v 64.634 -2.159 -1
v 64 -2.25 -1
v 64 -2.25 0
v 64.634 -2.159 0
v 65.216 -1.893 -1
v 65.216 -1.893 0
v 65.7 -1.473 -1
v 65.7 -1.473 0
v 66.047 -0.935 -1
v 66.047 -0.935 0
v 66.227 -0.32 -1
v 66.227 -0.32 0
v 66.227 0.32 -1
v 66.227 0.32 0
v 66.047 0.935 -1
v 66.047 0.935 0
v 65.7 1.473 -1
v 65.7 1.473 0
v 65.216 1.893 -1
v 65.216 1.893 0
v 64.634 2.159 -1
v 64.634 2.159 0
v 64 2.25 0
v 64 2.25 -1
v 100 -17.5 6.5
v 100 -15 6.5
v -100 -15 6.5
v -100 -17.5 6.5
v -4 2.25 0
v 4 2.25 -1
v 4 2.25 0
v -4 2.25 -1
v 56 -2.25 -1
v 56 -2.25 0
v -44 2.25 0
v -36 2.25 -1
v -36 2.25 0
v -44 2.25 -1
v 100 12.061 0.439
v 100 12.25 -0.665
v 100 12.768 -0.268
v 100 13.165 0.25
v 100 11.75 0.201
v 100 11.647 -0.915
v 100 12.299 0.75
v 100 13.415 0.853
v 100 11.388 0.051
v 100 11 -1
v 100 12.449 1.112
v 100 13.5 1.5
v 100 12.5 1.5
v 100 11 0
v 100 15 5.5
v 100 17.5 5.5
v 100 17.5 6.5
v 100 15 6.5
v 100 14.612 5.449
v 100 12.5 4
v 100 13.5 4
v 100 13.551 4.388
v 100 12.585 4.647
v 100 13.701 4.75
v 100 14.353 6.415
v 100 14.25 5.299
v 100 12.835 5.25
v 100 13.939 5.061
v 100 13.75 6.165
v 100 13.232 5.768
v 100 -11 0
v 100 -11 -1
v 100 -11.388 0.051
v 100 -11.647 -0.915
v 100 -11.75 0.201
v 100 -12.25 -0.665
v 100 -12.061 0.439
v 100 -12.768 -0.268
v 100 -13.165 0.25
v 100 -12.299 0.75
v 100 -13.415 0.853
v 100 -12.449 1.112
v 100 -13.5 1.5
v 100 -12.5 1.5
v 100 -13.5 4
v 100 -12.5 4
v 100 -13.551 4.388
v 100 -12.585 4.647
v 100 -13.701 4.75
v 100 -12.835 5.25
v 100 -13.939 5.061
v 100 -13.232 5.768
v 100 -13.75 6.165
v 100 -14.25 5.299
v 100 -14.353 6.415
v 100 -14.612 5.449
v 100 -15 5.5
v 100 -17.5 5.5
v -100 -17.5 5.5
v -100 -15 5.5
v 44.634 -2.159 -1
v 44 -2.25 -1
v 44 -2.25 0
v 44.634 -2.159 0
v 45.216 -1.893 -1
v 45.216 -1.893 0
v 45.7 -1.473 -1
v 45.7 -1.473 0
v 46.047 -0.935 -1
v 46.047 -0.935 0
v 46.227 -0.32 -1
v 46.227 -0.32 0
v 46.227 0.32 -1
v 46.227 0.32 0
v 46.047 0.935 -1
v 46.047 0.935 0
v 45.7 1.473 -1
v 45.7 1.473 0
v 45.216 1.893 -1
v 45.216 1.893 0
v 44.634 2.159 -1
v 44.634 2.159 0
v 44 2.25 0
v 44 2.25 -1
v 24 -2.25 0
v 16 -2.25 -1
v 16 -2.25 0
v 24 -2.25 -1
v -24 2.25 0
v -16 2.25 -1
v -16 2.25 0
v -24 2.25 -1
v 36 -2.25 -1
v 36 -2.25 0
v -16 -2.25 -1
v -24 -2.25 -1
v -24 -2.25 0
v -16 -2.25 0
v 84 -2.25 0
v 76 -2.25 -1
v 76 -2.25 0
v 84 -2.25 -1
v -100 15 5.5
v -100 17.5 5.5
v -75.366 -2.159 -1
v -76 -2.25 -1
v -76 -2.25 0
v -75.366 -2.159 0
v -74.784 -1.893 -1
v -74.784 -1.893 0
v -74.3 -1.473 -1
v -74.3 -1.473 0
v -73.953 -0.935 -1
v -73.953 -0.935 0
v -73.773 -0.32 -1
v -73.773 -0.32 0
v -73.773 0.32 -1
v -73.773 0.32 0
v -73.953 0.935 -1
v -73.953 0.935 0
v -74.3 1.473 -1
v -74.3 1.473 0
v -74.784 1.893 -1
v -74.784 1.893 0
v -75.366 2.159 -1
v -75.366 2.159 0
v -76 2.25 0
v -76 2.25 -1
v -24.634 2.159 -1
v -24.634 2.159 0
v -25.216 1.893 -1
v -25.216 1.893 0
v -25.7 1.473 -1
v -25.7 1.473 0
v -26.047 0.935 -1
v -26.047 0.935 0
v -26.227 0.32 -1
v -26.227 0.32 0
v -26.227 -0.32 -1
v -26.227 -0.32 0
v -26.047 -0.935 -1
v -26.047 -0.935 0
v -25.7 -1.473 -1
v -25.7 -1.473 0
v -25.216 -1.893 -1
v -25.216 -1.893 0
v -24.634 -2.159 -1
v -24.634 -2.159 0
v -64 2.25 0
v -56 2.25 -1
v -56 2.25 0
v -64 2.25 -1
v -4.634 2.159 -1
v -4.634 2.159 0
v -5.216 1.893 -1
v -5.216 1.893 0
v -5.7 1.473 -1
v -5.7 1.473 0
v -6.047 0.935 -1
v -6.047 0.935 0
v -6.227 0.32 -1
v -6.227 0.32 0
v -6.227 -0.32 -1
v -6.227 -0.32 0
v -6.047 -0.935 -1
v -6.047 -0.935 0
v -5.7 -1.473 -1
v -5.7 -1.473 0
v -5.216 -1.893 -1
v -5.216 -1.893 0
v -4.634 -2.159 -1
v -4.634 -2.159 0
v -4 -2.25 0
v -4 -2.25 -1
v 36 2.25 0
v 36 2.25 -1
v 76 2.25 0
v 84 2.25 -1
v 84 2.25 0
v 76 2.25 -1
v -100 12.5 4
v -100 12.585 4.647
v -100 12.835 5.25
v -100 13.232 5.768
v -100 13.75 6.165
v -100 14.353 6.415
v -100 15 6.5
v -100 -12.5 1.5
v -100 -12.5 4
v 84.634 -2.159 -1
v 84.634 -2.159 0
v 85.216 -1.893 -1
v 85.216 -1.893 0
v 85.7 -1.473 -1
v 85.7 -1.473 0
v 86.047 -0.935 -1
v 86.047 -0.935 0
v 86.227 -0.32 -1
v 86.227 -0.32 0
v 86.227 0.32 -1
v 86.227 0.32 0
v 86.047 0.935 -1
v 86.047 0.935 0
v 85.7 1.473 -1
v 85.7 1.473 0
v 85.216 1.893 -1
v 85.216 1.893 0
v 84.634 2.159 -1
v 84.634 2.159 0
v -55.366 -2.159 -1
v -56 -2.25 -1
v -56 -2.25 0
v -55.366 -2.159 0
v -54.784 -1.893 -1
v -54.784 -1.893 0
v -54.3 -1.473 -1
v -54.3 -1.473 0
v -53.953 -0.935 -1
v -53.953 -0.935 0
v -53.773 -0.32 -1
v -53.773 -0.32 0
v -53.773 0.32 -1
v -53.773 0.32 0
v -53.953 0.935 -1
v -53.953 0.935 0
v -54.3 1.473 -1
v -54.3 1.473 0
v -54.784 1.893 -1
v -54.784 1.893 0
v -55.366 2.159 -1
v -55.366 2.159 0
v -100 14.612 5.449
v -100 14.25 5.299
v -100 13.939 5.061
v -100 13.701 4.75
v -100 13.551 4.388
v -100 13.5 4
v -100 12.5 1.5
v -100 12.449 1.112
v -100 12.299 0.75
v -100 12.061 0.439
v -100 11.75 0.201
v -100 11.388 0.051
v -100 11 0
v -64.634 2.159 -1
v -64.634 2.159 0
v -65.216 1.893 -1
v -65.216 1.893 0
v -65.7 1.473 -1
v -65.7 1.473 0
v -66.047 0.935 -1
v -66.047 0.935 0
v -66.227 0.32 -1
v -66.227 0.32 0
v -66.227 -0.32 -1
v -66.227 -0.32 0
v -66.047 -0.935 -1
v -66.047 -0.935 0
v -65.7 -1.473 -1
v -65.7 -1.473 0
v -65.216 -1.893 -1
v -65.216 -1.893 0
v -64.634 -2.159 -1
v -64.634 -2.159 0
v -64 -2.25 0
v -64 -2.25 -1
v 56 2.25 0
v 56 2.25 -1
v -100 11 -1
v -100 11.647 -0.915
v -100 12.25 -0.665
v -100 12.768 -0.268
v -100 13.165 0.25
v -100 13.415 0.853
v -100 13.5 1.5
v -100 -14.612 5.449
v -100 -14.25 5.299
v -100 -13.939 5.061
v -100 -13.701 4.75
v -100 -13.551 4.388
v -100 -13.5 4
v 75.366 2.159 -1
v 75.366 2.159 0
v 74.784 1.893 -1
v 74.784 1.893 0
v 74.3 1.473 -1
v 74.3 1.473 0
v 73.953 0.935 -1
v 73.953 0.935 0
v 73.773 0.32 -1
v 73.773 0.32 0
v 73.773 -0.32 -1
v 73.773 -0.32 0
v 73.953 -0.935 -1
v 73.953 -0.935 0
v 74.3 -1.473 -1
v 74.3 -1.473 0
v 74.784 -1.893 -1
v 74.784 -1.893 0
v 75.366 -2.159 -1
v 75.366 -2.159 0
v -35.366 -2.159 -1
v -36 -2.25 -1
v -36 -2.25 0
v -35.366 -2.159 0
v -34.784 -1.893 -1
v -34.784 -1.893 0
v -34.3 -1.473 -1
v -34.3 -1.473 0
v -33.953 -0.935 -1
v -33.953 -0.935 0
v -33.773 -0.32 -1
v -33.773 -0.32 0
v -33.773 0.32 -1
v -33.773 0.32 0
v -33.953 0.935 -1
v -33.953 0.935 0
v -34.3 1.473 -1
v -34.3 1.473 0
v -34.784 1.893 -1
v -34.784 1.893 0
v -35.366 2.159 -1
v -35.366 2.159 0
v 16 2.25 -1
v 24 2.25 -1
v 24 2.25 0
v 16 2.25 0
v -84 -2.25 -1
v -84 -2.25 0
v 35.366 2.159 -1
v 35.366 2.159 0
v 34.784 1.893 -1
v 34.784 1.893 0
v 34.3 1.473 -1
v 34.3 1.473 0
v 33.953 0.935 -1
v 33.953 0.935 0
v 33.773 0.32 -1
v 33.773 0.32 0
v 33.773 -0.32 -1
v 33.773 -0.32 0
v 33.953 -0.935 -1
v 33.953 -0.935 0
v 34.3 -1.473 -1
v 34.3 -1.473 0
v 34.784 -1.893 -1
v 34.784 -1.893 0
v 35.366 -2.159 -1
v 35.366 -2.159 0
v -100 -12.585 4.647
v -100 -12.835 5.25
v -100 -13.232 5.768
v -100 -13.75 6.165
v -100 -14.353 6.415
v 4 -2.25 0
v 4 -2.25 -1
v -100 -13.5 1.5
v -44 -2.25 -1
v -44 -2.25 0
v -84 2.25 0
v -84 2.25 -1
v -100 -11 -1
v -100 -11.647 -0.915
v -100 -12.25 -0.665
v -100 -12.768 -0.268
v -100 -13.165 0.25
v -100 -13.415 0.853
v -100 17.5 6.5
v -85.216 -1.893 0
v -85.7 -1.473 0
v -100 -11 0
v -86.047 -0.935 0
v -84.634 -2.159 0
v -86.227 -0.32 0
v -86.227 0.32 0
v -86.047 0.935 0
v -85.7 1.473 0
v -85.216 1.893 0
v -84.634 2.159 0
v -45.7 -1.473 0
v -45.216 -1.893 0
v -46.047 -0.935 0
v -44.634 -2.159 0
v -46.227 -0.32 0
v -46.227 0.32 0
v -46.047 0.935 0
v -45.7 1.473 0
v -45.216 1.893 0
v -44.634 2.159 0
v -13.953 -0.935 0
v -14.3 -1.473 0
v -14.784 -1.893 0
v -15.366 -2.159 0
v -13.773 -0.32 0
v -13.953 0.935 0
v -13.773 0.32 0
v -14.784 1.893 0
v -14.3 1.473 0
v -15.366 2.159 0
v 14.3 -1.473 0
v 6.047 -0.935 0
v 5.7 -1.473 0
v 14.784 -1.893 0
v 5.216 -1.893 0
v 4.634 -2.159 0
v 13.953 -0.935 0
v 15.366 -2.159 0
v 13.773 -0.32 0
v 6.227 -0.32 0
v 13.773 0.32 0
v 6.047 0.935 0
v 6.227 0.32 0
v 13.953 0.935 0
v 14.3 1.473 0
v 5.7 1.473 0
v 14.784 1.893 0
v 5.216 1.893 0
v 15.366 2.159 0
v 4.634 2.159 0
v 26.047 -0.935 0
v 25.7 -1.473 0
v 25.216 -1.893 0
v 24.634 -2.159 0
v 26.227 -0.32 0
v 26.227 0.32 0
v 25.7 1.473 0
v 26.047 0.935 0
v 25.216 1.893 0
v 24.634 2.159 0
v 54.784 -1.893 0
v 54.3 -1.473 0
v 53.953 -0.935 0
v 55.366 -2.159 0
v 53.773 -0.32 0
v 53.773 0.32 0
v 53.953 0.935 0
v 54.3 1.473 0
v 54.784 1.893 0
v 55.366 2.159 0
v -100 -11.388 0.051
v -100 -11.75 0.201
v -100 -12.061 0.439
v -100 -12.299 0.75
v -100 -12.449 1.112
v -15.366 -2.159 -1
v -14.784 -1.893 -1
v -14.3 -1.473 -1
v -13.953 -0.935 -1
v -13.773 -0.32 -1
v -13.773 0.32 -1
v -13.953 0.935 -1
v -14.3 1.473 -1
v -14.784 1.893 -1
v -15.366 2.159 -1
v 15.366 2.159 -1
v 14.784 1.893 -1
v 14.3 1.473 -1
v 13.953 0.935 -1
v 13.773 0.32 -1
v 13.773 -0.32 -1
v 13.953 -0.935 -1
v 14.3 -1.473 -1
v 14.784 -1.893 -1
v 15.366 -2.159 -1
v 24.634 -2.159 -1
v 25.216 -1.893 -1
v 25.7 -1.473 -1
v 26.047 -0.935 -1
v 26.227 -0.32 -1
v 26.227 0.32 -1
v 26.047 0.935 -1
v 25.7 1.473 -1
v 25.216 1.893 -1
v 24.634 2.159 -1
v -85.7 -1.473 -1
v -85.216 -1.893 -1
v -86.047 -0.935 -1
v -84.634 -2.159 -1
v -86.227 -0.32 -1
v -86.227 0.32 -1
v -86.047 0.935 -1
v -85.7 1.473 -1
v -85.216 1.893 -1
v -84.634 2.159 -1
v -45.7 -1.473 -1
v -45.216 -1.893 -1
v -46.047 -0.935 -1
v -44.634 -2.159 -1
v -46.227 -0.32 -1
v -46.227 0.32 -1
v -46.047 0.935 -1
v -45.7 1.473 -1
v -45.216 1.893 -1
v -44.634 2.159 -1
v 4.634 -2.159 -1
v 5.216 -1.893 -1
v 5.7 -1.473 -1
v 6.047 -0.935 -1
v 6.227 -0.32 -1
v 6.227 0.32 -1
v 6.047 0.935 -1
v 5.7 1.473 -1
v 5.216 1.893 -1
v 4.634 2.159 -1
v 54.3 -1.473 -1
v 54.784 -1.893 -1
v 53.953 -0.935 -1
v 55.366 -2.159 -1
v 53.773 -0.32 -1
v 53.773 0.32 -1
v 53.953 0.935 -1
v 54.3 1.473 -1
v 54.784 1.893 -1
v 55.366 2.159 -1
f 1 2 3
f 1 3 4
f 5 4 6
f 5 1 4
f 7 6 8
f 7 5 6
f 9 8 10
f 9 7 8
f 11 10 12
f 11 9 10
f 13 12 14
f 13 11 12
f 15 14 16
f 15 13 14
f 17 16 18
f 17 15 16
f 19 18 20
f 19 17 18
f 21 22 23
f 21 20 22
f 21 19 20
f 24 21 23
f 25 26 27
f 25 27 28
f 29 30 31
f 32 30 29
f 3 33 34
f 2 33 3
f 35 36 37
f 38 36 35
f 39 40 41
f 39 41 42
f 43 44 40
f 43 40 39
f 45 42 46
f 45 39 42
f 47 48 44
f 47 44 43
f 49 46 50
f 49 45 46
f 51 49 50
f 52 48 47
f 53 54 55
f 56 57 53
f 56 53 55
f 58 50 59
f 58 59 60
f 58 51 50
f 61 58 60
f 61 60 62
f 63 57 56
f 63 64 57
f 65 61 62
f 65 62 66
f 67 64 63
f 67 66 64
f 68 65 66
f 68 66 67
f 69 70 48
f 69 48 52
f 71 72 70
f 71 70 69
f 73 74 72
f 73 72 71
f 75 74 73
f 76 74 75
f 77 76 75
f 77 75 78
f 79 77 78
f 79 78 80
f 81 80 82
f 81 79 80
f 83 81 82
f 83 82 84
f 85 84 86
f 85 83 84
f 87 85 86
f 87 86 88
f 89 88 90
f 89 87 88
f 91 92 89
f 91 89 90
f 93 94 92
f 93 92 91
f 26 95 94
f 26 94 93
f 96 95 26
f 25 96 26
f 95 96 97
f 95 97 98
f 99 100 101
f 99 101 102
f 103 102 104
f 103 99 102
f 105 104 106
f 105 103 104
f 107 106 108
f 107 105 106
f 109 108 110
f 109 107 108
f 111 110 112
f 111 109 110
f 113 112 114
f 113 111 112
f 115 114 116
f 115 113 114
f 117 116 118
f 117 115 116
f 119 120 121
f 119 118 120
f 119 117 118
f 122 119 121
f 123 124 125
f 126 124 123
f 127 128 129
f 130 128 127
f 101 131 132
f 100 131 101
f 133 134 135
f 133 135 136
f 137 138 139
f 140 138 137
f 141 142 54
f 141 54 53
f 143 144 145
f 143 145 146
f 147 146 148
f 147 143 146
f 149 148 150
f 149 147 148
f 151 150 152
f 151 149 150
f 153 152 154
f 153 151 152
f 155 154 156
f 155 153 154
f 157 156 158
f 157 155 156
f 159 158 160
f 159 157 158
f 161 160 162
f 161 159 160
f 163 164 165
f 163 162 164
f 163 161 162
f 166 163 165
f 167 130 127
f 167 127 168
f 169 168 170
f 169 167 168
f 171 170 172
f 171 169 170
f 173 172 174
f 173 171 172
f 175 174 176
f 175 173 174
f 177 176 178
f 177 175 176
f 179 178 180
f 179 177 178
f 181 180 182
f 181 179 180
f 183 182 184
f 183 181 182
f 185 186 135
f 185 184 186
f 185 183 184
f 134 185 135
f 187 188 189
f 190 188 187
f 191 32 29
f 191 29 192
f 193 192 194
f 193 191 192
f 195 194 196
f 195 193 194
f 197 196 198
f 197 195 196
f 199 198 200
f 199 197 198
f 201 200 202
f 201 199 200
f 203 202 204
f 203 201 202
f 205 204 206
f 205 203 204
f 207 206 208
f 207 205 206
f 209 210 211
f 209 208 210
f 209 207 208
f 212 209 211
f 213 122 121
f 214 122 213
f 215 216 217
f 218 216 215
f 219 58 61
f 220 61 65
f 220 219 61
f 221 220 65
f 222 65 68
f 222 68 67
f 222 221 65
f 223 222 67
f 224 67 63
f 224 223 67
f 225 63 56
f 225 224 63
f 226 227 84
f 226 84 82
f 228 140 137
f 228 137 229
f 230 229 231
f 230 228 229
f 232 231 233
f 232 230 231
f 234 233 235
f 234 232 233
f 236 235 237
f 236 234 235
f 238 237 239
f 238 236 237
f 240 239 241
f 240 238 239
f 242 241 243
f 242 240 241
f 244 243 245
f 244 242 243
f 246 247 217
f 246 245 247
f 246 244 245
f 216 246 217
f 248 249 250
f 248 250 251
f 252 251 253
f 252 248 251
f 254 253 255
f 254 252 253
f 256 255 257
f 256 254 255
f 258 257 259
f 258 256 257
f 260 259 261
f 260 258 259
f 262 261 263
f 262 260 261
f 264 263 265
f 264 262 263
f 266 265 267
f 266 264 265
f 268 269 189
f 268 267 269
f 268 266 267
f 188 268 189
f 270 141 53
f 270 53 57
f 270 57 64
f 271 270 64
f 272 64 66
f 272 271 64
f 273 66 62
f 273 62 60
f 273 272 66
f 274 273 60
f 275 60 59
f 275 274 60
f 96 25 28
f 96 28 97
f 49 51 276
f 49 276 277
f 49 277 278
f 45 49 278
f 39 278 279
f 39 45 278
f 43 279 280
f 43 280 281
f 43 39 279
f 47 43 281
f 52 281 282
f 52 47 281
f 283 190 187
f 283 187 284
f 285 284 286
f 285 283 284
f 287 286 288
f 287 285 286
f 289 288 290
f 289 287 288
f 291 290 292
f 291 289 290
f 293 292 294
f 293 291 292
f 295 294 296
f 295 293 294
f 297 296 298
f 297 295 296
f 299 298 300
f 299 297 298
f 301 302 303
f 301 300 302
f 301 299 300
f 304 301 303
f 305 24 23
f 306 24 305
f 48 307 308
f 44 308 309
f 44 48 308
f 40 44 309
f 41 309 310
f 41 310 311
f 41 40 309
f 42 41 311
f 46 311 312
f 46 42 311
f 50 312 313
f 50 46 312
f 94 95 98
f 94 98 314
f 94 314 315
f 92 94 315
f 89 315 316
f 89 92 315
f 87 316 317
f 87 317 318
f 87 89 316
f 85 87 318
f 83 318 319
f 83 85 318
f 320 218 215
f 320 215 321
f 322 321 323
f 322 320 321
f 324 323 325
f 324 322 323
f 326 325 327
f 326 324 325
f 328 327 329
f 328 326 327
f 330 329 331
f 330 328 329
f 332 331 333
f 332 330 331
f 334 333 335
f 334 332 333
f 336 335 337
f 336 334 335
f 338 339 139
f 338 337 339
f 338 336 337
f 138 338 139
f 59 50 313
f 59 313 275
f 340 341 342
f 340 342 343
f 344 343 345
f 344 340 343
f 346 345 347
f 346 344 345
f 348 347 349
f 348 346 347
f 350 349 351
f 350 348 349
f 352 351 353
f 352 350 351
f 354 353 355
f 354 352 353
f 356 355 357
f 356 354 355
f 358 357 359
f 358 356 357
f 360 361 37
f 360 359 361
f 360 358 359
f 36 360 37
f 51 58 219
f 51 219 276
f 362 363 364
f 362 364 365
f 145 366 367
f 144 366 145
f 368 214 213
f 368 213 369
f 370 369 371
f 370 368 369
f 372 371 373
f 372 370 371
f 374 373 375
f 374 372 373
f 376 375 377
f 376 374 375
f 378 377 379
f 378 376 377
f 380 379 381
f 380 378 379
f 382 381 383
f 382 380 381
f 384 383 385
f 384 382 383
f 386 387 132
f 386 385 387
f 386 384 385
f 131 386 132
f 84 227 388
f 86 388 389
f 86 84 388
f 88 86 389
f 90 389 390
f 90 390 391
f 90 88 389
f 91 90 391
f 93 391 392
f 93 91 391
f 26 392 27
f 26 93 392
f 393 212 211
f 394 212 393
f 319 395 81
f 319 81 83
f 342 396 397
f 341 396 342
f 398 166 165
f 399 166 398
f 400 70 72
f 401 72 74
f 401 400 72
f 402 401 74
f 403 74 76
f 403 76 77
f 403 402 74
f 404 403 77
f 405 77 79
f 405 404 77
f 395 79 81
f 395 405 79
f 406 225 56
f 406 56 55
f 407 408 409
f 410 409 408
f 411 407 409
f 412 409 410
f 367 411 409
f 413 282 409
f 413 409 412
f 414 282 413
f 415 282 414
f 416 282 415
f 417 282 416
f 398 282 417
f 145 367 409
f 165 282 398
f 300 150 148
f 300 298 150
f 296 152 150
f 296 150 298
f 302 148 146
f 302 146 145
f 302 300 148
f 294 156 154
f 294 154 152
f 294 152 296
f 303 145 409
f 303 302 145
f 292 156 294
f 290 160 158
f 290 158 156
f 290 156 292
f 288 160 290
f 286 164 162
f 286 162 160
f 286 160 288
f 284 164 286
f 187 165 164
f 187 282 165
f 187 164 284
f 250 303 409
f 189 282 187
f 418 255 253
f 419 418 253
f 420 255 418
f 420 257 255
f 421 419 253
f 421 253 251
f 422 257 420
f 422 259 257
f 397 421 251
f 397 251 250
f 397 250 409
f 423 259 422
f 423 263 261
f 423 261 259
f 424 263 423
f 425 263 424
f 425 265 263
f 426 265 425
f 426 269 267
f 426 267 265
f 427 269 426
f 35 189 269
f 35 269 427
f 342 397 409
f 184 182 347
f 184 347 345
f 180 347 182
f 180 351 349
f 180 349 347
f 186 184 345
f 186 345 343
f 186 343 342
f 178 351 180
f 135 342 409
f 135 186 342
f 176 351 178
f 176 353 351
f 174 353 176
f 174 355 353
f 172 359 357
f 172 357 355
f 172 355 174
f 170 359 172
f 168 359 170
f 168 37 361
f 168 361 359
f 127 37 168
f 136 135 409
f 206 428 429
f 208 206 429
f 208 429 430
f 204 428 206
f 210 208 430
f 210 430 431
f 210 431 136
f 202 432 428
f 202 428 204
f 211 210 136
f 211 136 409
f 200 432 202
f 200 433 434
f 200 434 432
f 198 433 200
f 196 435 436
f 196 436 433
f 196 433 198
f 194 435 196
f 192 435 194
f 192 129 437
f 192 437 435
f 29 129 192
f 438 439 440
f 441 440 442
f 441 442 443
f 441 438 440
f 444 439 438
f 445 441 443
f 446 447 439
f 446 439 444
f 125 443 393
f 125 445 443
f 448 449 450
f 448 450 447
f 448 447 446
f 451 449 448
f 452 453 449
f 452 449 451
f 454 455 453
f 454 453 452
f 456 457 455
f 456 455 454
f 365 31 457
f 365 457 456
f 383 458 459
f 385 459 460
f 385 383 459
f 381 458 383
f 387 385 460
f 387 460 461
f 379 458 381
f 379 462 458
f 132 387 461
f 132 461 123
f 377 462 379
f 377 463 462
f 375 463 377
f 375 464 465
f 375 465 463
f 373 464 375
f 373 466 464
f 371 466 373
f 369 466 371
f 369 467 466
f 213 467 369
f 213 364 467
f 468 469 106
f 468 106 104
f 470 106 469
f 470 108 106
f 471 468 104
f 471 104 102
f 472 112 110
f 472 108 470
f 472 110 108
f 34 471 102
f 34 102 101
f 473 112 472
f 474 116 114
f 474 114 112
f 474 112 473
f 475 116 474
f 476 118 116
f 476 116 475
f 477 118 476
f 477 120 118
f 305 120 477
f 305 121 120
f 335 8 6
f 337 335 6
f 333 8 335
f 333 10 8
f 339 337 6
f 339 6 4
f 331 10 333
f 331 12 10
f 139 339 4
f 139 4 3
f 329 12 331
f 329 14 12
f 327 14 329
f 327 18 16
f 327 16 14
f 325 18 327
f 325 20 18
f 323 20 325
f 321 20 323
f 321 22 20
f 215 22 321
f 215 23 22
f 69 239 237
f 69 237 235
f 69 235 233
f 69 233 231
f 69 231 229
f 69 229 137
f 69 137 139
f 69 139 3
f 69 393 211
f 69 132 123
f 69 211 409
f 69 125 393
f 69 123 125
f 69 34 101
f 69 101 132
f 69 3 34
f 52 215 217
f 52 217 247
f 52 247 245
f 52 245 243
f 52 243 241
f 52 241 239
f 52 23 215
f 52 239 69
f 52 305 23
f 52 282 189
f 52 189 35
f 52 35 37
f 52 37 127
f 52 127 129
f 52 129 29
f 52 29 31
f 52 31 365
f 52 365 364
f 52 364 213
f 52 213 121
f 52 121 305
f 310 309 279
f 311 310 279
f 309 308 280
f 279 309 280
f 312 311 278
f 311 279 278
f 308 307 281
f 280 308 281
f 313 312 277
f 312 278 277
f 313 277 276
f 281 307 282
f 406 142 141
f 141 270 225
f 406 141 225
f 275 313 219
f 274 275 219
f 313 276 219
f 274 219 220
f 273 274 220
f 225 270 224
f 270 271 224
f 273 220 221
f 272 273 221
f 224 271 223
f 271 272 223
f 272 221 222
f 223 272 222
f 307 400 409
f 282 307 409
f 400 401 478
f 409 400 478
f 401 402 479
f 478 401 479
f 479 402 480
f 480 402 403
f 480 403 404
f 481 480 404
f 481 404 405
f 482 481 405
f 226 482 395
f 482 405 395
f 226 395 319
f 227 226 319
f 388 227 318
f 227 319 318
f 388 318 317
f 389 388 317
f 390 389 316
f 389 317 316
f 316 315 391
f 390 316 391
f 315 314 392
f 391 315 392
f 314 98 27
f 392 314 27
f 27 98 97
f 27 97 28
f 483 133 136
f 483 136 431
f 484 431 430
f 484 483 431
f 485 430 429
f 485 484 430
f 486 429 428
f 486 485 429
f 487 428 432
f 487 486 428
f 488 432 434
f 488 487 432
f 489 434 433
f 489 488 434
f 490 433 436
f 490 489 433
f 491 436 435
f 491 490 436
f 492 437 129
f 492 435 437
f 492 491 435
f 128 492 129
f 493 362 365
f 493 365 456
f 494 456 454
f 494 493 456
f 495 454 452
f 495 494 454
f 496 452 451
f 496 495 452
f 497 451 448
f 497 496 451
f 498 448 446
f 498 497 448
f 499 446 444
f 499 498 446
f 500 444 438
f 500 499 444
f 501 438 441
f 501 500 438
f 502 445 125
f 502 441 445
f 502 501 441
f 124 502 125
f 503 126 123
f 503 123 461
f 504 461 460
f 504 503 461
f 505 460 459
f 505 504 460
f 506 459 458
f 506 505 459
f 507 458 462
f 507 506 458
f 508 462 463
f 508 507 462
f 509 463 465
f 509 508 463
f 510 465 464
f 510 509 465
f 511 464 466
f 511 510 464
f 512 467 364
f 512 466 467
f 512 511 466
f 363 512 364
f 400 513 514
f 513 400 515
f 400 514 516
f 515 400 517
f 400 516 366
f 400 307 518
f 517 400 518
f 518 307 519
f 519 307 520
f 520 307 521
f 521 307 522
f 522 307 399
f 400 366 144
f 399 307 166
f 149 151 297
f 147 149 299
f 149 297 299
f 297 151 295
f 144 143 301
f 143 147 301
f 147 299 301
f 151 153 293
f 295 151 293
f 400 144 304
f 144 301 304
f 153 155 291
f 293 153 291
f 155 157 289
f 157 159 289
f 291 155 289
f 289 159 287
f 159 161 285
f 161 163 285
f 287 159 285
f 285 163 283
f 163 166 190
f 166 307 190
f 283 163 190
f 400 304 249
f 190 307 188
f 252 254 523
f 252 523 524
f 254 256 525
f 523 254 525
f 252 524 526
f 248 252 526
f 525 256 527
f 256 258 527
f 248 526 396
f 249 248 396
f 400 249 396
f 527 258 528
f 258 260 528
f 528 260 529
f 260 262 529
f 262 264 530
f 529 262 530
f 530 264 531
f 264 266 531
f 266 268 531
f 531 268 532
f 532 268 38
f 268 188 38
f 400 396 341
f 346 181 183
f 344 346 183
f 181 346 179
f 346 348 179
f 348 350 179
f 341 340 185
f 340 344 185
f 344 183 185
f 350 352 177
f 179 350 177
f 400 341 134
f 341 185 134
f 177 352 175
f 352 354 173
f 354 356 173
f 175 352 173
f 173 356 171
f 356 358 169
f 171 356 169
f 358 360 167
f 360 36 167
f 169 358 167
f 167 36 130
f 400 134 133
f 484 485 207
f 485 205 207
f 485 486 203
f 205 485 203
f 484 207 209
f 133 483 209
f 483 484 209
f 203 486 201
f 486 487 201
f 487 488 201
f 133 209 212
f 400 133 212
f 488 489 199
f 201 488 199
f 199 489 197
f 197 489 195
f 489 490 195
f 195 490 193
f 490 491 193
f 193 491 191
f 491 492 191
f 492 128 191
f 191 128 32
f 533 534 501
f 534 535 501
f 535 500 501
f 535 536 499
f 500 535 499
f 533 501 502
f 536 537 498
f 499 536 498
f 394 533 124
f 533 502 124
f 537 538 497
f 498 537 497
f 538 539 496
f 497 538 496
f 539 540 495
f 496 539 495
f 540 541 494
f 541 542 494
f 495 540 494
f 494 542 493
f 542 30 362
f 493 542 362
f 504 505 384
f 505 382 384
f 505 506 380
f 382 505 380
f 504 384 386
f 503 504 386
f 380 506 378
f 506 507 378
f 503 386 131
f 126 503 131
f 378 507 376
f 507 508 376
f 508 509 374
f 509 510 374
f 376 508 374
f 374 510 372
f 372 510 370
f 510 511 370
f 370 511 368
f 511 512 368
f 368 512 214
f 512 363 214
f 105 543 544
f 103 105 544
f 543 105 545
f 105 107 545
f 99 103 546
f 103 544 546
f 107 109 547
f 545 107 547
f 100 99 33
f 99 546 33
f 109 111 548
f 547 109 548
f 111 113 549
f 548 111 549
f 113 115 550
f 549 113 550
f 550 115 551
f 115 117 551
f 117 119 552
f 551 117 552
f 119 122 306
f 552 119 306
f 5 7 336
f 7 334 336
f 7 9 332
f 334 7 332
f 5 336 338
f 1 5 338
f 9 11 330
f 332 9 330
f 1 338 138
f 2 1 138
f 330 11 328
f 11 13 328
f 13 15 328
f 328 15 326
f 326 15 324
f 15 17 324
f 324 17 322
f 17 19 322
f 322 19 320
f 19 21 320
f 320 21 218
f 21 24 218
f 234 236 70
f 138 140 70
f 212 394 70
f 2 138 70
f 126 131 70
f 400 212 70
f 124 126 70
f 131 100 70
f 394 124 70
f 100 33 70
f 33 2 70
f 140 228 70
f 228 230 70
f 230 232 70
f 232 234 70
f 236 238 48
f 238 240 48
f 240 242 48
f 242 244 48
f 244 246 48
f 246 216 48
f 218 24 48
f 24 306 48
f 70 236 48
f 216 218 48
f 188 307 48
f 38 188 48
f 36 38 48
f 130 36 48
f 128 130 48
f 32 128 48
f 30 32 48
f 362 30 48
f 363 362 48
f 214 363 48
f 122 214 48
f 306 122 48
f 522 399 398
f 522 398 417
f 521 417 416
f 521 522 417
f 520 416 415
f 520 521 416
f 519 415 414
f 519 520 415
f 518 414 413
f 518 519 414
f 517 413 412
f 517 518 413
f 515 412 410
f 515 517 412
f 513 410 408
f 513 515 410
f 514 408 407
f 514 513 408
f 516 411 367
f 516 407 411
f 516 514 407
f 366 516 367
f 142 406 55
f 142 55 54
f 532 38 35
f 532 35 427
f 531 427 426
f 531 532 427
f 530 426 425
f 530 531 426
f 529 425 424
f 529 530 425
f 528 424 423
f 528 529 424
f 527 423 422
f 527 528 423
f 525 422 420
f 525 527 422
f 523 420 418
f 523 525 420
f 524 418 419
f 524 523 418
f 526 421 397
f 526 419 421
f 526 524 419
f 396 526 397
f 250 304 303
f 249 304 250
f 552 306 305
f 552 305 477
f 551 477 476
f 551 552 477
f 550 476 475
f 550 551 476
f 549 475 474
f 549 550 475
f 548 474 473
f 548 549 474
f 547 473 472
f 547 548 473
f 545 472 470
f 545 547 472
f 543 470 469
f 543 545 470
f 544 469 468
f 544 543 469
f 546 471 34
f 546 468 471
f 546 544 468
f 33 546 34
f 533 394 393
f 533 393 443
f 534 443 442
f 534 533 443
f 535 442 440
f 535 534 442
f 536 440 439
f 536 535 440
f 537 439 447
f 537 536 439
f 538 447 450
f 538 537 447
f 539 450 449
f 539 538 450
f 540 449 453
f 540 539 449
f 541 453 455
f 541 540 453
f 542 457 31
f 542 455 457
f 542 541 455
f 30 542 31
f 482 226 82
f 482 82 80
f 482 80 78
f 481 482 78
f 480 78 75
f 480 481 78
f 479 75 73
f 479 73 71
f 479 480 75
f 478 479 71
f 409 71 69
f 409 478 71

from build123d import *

# Parameters (mm, degrees)
SKETCH_1_W                         = 200
SKETCH_1_H                         = 27
SM_BASE_FLANGE_1_DEPTH             = 1
SM_EDGE_FLANGE_1_STRIP_W           = 7
SM_EDGE_FLANGE_1_STRIP_H           = 1
SM_EDGE_FLANGE_1_STRIP_CUT_DEPTH   = 200
SM_EDGE_FLANGE_1_STRIP_2_W         = 7
SM_EDGE_FLANGE_1_STRIP_2_H         = 1
SM_EDGE_FLANGE_1_STRIP_CUT_2_DEPTH = 200
SM_EDGE_FLANGE_1_DEPTH             = 200
SM_EDGE_FLANGE_1_BEND_DEPTH        = 200
SM_EDGE_FLANGE_2_STRIP_W           = 7
SM_EDGE_FLANGE_2_STRIP_H           = 1
SM_EDGE_FLANGE_2_STRIP_CUT_DEPTH   = 200
SM_EDGE_FLANGE_2_STRIP_2_W         = 7
SM_EDGE_FLANGE_2_STRIP_2_H         = 1
SM_EDGE_FLANGE_2_STRIP_CUT_2_DEPTH = 200
SM_EDGE_FLANGE_2_DEPTH             = 200
SM_EDGE_FLANGE_2_BEND_DEPTH        = 200
CUT_EXTRUDE_1_DEPTH                = 10
PATTERN_LINEAR_1_COUNT             = 5
PATTERN_LINEAR_1_PITCH             = 20
PATTERN_LINEAR_1_COL_COUNT         = 5
PATTERN_LINEAR_1_COL_PITCH         = 20


# Sheet-metal steps are written as plain solids
with BuildPart() as part:
    # Sketch 1 → 基体-法兰1 (new body)
    with BuildSketch(Plane.XY):
        Rectangle(SKETCH_1_W, SKETCH_1_H)
    extrude(amount=-SM_BASE_FLANGE_1_DEPTH)

    # 边线-法兰1 strip (across the edge) → 边线-法兰1 strip cut (cut)
    with BuildSketch(Plane(origin=(100, 13.5, 0), x_dir=(0, -1, 0), z_dir=(-1, 0, 0))):
        with Locations((-1, -0.5)):
            Rectangle(SM_EDGE_FLANGE_1_STRIP_W, SM_EDGE_FLANGE_1_STRIP_H)
    extrude(amount=SM_EDGE_FLANGE_1_STRIP_CUT_DEPTH, mode=Mode.SUBTRACT)

    # 边线-法兰1 strip 2 (across the edge) → 边线-法兰1 strip cut 2 (cut)
    with BuildSketch(Plane(origin=(-100, -13.5, 0), x_dir=(0, 1, 0), z_dir=(1, 0, 0))):
        with Locations((-1, -0.5)):
            Rectangle(SM_EDGE_FLANGE_1_STRIP_2_W, SM_EDGE_FLANGE_1_STRIP_2_H)
    extrude(amount=SM_EDGE_FLANGE_1_STRIP_CUT_2_DEPTH, mode=Mode.SUBTRACT)

    # 边线-法兰1 section (across the edge) → 边线-法兰1 (add)
    with BuildSketch(Plane(origin=(100, 13.5, 0), x_dir=(0, -1, 0), z_dir=(-1, 0, 0))):
        with BuildLine():
            Line((0, 1.5), (0, 6.5))
            Line((0, 6.5), (1, 6.5))
            Line((1, 6.5), (1, 1.5))
            ThreePointArc((1, 1.5), (1.439339828, 0.439339828), (2.5, 0))
            Line((2.5, 0), (2.5, -1))
            ThreePointArc((2.5, -1), (0.732233047, -0.267766953), (0, 1.5))
        make_face()
    extrude(amount=SM_EDGE_FLANGE_1_DEPTH)

    # 边线-法兰1 section 2 (across the edge) → 边线-法兰1 bend (add)
    with BuildSketch(Plane(origin=(-100, -13.5, 0), x_dir=(0, 1, 0), z_dir=(1, 0, 0))):
        with BuildLine():
            Line((0, 1.5), (0, 6.5))
            Line((0, 6.5), (1, 6.5))
            Line((1, 6.5), (1, 1.5))
            ThreePointArc((1, 1.5), (1.439339828, 0.439339828), (2.5, 0))
            Line((2.5, 0), (2.5, -1))
            ThreePointArc((2.5, -1), (0.732233047, -0.267766953), (0, 1.5))
        make_face()
    extrude(amount=SM_EDGE_FLANGE_1_BEND_DEPTH)

    # 边线-法兰2 strip (across the edge) → 边线-法兰2 strip cut (cut)
    with BuildSketch(Plane(origin=(-100, 13.5, 6.5), x_dir=(0, 0, -1), z_dir=(1, 0, 0))):
        with Locations((-1, -0.5)):
            Rectangle(SM_EDGE_FLANGE_2_STRIP_W, SM_EDGE_FLANGE_2_STRIP_H)
    extrude(amount=SM_EDGE_FLANGE_2_STRIP_CUT_DEPTH, mode=Mode.SUBTRACT)

    # 边线-法兰2 strip 2 (across the edge) → 边线-法兰2 strip cut 2 (cut)
    with BuildSketch(Plane(origin=(100, -13.5, 6.5), x_dir=(0, 0, -1), z_dir=(-1, 0, 0))):
        with Locations((-1, -0.5)):
            Rectangle(SM_EDGE_FLANGE_2_STRIP_2_W, SM_EDGE_FLANGE_2_STRIP_2_H)
    extrude(amount=SM_EDGE_FLANGE_2_STRIP_CUT_2_DEPTH, mode=Mode.SUBTRACT)

    # 边线-法兰2 section (across the edge) → 边线-法兰2 (add)
    with BuildSketch(Plane(origin=(-100, 13.5, 6.5), x_dir=(0, 0, -1), z_dir=(1, 0, 0))):
        with BuildLine():
            Line((0, 1.5), (0, 4))
            Line((0, 4), (1, 4))
            Line((1, 4), (1, 1.5))
            ThreePointArc((1, 1.5), (1.439339828, 0.439339828), (2.5, 0))
            Line((2.5, 0), (2.5, -1))
            ThreePointArc((2.5, -1), (0.732233047, -0.267766953), (0, 1.5))
        make_face()
    extrude(amount=SM_EDGE_FLANGE_2_DEPTH)

    # 边线-法兰2 section 2 (across the edge) → 边线-法兰2 bend (add)
    with BuildSketch(Plane(origin=(100, -13.5, 6.5), x_dir=(0, 0, -1), z_dir=(-1, 0, 0))):
        with BuildLine():
            Line((0, 1.5), (0, 4))
            Line((0, 4), (1, 4))
            Line((1, 4), (1, 1.5))
            ThreePointArc((1, 1.5), (1.439339828, 0.439339828), (2.5, 0))
            Line((2.5, 0), (2.5, -1))
            ThreePointArc((2.5, -1), (0.732233047, -0.267766953), (0, 1.5))
        make_face()
    extrude(amount=SM_EDGE_FLANGE_2_BEND_DEPTH)

    # 草图18 → 切除-拉伸1 (cut)
    with BuildSketch(Plane(origin=(0, 0, -1), x_dir=(-1, 0, 0), z_dir=(0, 0, -1))):
        with BuildLine():
            Line((-4, 2.25), (4, 2.25))
            ThreePointArc((4, 2.25), (6.25, 0), (4, -2.25))
            Line((4, -2.25), (-4, -2.25))
            ThreePointArc((-4, -2.25), (-6.25, 0), (-4, 2.25))
        make_face()
    cut_extrude_1 = extrude(amount=-CUT_EXTRUDE_1_DEPTH, mode=Mode.SUBTRACT)

    # 阵列(线性)1: 切除-拉伸1 ×5
    with Locations(*[(i * PATTERN_LINEAR_1_PITCH, 0, 0) for i in range(1, PATTERN_LINEAR_1_COUNT)]):
        add(cut_extrude_1, mode=Mode.SUBTRACT)

    # 阵列(线性)1 col: 切除-拉伸1 ×5
    with Locations(*[(-i * PATTERN_LINEAR_1_COL_PITCH, 0, 0) for i in range(1, PATTERN_LINEAR_1_COL_COUNT)]):
        add(cut_extrude_1, mode=Mode.SUBTRACT)


solid = part.part
